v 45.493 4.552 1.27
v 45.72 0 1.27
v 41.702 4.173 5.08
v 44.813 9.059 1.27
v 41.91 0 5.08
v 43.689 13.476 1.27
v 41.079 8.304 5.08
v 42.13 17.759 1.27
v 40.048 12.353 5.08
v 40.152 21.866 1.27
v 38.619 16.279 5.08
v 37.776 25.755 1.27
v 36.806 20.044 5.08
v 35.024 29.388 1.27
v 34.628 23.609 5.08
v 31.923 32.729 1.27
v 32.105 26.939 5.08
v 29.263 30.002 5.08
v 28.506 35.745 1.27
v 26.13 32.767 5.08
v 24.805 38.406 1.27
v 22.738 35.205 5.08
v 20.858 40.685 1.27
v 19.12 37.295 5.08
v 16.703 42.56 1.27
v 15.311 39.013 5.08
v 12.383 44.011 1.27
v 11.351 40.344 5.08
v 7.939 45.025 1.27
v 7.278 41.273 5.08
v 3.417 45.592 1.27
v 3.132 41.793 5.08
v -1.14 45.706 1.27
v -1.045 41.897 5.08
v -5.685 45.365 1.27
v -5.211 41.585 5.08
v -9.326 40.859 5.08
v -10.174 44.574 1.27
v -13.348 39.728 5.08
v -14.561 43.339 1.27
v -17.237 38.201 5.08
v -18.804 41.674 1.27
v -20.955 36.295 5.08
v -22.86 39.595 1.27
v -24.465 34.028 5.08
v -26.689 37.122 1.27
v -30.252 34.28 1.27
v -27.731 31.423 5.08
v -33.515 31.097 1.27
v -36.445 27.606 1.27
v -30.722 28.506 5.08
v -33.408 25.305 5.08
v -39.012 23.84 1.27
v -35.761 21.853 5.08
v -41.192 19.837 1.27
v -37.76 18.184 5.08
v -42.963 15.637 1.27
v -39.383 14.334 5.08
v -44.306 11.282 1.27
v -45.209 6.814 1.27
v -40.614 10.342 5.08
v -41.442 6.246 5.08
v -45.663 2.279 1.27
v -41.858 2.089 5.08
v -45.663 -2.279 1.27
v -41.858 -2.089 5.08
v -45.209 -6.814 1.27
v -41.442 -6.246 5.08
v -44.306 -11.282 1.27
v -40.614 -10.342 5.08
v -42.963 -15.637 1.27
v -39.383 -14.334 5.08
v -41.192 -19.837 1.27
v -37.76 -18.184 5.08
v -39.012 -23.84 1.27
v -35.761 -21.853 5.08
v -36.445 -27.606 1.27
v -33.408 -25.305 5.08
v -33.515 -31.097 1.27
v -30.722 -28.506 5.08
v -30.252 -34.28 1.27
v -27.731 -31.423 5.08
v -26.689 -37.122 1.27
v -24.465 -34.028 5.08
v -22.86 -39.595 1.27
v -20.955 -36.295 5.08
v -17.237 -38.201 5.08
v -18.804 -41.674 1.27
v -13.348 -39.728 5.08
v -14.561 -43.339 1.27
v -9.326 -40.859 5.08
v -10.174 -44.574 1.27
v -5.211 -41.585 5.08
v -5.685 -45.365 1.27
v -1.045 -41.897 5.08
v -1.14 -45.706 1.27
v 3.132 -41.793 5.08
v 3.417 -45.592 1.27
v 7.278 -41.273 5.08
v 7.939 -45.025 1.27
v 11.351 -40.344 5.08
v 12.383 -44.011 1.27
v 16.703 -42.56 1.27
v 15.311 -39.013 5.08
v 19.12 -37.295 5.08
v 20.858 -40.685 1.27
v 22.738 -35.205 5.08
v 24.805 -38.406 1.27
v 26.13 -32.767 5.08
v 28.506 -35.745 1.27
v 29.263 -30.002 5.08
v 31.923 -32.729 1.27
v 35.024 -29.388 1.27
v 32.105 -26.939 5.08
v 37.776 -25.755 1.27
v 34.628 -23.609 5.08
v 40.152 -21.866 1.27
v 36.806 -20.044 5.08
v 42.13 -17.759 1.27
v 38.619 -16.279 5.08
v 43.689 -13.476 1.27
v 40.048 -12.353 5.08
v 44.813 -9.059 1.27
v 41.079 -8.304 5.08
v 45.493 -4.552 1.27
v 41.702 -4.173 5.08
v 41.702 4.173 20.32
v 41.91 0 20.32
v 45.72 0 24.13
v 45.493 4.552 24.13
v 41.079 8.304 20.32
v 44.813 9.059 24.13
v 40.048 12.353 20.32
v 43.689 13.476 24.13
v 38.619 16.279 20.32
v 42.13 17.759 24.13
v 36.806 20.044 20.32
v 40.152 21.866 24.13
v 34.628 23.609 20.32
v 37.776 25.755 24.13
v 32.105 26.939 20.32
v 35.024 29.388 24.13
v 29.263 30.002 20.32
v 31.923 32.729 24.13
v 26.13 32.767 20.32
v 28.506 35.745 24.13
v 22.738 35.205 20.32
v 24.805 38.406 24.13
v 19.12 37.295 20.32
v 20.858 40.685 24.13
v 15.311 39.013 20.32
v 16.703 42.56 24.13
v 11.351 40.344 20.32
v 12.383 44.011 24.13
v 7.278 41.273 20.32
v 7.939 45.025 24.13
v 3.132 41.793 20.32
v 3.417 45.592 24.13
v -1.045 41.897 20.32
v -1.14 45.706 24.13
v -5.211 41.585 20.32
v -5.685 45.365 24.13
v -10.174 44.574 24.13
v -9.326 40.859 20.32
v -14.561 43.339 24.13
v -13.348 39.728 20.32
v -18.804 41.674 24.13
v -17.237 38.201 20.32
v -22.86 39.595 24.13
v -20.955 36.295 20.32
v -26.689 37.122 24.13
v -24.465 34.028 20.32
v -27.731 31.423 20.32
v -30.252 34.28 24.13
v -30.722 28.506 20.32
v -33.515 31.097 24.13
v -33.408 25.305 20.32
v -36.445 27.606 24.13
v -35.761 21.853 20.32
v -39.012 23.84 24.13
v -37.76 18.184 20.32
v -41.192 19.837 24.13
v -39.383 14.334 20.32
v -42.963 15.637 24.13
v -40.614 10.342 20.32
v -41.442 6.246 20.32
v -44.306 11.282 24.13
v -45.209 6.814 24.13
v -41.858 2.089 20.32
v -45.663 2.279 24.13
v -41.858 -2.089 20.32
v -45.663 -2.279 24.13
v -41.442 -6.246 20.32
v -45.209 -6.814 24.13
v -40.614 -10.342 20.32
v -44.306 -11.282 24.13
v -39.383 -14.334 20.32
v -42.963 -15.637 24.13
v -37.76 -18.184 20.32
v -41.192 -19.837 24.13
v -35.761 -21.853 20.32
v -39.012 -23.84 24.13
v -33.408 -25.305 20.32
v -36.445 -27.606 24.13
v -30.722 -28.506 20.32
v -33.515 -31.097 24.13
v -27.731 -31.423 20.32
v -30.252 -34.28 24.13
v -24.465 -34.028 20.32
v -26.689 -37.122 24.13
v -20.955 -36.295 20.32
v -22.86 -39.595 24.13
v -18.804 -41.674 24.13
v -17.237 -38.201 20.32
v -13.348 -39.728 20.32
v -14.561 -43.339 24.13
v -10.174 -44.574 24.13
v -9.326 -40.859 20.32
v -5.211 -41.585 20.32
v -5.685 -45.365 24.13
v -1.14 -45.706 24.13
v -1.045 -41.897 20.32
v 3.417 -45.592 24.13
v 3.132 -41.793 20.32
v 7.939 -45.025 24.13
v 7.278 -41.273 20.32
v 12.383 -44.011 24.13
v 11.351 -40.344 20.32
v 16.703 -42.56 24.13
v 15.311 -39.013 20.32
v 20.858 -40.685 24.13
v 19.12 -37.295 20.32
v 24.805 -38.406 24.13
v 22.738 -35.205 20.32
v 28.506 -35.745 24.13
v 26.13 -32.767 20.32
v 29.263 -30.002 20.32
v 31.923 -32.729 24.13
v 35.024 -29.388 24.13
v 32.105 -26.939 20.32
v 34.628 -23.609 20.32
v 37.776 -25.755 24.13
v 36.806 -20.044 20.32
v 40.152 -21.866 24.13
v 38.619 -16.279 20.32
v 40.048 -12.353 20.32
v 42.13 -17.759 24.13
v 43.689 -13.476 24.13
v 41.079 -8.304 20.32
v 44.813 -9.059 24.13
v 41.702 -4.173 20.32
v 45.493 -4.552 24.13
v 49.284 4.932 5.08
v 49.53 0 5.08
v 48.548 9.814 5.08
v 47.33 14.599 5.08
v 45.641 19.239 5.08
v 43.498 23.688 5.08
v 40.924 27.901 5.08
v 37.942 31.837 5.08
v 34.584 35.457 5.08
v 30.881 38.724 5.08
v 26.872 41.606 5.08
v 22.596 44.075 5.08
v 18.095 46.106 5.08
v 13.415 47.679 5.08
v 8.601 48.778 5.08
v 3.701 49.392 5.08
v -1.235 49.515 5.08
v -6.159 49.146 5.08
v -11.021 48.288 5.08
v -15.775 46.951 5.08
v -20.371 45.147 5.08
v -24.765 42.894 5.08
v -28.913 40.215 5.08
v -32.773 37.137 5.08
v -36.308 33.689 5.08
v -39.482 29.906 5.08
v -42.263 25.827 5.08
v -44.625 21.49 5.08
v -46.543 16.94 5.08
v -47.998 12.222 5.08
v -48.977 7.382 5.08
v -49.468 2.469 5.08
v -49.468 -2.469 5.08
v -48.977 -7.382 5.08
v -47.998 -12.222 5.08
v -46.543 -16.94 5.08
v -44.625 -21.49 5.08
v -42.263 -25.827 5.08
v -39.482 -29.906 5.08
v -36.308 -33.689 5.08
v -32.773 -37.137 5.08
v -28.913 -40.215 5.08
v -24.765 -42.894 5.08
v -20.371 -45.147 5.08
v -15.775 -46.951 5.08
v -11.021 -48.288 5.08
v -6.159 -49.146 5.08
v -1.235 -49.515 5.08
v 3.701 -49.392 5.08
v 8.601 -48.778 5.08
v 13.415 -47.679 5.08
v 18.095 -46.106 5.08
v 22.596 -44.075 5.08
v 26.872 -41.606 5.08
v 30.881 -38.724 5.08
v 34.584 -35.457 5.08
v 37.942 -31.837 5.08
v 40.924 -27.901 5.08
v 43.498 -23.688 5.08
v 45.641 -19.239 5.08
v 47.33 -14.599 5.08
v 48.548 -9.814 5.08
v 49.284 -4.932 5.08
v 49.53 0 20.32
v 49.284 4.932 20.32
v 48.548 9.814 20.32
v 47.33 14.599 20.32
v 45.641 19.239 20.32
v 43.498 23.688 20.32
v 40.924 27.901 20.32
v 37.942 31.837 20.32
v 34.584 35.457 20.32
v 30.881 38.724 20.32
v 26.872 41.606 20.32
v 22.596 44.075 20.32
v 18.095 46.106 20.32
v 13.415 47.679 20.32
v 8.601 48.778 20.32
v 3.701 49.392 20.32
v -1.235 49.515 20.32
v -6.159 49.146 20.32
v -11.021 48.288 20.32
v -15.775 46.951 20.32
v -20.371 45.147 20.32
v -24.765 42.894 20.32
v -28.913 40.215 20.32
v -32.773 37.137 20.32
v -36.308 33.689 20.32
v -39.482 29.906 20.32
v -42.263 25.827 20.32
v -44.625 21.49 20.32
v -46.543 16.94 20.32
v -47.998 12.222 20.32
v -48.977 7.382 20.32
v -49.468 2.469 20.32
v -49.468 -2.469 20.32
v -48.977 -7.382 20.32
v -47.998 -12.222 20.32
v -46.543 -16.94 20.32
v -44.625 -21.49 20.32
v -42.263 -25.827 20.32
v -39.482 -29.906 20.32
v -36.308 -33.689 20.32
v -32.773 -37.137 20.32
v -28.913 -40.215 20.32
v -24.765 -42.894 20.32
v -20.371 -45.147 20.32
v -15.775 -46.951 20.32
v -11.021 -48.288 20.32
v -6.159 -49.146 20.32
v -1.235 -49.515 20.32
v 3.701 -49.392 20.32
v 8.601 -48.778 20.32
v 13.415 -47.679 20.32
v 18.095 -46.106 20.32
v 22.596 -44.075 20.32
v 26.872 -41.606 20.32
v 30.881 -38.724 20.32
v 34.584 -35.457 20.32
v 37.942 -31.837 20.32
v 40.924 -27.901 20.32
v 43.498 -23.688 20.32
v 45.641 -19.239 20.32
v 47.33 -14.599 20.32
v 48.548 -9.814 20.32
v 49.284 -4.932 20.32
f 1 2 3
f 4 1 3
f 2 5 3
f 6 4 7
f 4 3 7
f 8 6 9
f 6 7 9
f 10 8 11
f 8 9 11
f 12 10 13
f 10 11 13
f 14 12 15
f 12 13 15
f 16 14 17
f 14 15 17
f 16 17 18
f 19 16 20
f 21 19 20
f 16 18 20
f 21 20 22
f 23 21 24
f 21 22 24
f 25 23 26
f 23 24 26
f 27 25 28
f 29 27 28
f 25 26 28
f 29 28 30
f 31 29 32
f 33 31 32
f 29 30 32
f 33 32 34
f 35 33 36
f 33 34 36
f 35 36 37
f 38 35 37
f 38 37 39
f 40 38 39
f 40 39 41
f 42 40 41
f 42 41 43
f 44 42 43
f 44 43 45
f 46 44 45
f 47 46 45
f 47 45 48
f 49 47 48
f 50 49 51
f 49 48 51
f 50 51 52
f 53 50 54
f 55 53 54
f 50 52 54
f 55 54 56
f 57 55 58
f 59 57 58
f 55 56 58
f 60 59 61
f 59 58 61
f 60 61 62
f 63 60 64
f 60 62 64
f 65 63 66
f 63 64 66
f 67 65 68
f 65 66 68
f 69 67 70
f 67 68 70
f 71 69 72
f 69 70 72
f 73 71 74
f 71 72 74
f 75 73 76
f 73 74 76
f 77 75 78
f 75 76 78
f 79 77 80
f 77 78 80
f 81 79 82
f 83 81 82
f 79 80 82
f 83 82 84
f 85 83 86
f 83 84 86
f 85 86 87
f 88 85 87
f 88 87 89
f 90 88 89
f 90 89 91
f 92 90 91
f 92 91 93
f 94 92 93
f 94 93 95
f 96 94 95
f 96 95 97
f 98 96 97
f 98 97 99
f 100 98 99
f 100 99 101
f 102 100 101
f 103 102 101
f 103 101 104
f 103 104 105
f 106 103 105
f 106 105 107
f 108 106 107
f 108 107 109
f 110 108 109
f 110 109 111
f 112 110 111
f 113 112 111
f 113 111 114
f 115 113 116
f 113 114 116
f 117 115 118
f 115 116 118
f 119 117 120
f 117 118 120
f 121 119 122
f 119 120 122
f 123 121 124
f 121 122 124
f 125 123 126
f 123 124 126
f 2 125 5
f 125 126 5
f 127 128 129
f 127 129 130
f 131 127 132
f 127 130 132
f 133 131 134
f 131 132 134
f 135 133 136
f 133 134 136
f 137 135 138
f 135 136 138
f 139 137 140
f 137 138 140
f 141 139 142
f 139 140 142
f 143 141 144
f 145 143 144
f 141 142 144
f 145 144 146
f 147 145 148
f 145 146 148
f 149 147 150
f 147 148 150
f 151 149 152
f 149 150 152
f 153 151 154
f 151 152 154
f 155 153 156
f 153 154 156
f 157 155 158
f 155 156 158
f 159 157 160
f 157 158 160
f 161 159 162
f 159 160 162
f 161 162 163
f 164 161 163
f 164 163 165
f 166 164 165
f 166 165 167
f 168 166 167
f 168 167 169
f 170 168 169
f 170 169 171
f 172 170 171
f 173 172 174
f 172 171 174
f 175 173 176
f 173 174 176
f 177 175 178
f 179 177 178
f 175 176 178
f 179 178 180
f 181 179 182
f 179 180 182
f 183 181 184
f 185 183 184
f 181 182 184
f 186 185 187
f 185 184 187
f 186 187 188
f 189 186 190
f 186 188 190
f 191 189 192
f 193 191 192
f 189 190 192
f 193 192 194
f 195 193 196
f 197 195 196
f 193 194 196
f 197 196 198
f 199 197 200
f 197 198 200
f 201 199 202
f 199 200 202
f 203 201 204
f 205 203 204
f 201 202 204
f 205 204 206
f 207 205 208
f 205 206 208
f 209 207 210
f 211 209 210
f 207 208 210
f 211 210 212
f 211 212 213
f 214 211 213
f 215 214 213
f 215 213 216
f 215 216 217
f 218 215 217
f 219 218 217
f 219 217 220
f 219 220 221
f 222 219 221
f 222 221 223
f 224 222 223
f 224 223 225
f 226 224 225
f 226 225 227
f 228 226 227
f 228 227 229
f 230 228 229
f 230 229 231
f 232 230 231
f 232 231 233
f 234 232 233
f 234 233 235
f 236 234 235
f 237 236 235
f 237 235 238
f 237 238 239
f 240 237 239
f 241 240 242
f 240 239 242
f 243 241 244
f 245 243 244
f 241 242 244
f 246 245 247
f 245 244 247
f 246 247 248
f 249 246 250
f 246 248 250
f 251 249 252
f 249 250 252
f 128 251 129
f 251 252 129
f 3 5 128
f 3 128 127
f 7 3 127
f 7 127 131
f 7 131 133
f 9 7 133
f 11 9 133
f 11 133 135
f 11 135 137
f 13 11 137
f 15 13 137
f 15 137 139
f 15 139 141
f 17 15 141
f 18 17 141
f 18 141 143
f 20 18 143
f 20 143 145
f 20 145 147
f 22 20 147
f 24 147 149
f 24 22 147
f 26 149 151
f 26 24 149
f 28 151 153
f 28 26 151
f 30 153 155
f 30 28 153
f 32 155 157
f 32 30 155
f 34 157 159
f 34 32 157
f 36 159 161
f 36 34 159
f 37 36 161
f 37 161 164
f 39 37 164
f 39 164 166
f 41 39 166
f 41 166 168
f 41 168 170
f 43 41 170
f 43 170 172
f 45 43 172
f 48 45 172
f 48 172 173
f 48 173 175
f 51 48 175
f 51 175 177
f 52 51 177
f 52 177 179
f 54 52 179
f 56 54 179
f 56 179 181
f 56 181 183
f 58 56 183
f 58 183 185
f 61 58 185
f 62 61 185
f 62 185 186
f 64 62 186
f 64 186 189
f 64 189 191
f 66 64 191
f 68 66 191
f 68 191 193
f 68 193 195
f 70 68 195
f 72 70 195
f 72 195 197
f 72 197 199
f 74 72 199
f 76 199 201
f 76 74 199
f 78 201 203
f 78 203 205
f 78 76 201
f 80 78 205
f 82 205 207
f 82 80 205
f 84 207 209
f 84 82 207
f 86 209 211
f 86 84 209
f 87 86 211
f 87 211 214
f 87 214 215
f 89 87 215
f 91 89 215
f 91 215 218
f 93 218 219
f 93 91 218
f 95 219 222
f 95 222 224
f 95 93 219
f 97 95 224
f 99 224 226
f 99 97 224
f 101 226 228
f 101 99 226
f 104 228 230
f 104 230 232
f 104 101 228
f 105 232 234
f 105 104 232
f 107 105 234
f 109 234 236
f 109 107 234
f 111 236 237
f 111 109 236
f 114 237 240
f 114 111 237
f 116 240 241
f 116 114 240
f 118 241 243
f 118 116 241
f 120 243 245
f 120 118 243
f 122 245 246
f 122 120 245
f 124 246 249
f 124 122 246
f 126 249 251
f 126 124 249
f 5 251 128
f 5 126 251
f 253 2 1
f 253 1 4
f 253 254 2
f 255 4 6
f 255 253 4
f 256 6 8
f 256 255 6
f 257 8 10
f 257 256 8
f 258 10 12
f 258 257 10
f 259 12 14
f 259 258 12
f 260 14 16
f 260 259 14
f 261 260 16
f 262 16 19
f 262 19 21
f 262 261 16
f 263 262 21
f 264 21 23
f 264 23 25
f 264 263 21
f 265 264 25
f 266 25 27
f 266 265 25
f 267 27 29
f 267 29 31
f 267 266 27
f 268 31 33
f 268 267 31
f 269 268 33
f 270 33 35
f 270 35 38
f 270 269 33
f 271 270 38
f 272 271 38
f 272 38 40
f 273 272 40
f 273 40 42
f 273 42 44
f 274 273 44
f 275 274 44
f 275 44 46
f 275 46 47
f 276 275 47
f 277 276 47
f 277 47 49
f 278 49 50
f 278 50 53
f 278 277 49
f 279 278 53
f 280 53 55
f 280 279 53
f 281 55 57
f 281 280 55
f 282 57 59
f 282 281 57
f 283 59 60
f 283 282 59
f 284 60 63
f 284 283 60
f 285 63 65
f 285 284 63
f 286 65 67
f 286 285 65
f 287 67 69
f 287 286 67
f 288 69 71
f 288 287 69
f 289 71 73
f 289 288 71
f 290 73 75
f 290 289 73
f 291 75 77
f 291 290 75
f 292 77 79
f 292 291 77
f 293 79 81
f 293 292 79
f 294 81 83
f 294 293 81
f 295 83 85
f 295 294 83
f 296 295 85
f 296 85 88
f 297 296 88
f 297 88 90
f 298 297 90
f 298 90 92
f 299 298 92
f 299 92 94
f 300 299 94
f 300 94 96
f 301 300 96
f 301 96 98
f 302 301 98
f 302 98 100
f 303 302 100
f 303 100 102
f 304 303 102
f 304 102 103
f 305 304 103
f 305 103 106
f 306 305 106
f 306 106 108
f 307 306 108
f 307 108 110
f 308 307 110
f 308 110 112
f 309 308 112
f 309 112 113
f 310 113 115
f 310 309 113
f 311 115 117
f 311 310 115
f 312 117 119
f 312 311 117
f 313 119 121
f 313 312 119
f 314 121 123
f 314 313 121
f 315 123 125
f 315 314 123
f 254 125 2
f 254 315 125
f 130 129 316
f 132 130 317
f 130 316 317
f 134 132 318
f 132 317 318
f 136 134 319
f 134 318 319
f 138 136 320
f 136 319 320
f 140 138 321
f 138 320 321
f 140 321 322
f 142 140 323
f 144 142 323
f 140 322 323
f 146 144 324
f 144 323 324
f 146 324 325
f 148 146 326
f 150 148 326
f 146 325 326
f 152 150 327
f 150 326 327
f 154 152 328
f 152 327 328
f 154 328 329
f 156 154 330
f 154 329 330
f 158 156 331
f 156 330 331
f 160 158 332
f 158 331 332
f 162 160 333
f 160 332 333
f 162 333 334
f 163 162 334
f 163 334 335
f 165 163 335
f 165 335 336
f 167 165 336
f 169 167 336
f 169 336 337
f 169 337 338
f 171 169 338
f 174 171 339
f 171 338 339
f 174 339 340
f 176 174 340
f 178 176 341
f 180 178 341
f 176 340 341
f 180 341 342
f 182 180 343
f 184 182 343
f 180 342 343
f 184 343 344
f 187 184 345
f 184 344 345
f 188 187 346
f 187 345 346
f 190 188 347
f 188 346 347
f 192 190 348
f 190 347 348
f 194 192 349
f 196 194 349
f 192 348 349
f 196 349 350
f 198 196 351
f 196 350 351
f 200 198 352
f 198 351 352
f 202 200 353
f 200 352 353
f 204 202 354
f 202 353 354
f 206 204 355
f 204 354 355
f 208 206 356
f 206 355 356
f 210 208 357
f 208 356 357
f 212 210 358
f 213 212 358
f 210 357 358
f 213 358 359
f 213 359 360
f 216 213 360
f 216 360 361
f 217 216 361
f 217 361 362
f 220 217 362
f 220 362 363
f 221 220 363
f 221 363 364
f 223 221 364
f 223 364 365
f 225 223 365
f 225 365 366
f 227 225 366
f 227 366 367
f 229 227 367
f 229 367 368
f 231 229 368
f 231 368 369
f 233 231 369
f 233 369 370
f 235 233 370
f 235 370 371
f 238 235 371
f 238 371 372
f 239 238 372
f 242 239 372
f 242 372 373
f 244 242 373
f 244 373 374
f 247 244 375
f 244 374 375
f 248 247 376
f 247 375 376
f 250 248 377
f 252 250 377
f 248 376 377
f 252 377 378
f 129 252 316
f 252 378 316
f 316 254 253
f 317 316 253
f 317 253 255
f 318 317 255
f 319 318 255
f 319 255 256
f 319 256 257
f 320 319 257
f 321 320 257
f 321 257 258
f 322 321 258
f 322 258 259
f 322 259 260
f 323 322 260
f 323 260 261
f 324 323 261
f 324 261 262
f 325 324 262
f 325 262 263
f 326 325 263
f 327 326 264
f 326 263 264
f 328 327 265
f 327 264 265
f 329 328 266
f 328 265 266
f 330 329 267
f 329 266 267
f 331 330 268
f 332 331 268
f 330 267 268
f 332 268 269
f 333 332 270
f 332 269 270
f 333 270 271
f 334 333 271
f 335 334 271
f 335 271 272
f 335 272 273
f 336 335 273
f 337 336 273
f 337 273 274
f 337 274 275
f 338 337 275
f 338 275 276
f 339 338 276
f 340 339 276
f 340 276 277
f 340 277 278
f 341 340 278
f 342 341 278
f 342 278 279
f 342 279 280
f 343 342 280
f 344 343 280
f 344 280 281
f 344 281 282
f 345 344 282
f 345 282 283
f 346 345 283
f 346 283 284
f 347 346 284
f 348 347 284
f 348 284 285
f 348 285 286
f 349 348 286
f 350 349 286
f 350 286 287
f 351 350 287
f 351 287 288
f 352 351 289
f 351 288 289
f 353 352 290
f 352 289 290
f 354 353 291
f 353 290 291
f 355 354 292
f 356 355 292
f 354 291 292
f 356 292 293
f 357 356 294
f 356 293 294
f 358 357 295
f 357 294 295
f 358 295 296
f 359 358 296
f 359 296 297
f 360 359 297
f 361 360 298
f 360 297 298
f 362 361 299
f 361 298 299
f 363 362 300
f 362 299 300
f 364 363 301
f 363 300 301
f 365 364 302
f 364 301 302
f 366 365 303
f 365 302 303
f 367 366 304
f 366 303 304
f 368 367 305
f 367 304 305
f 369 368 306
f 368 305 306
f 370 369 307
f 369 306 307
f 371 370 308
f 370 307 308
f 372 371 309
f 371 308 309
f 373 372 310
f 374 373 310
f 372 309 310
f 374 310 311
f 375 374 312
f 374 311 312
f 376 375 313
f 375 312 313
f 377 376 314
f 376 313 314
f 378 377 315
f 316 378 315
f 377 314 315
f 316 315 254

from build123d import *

# Parameters (mm, degrees)
F0_R     = 49.53
F0_R_2   = 41.91
F1_DEPTH = 25.4
F2_SIZE  = 5.08
F4_SIZE  = 5.08


# Not quite as in the source:
# - a fillet or chamfer that OpenCascade refuses, or shapes differently, is made with other operations: its cross-section is extruded or revolved along the edge and cut away or added


with BuildPart() as f1:
    # F0 (on Top) → F1 (new body)
    with BuildSketch(Plane.XY):
        Circle(F0_R)
        Circle(F0_R_2, mode=Mode.SUBTRACT)
    extrude(amount=F1_DEPTH)

    # F2
    f2_edges = [f1.edges().sort_by_distance(p)[0] for p in [
        (-41.91, 0, 25.4),
    ]]
    chamfer(f2_edges, length=F2_SIZE)

    # F3: chamfer of 5.08 on 1 edges, made by hand

    # F3_s1 → F3_t2 (revolve, cut)
    with BuildSketch(Plane.XZ):
        Polygon((44.45, 25.4), (49.53, 20.32), (49.53, 25.4), align=None)
    revolve(axis=Axis((0, 0, 25.4), (0, 0, 1)), mode=Mode.SUBTRACT)

    # F4
    f4_edges = [f1.edges().sort_by_distance(p)[0] for p in [
        (-49.53, 0, 0),
    ]]
    chamfer(f4_edges, length=F4_SIZE)

    # F5: chamfer of 5.08 on 1 edges, made by hand

    # F5_s1 → F5_t2 (revolve, cut)
    with BuildSketch(Plane.XZ):
        Polygon((46.99, 0), (41.91, 5.08), (41.91, 0), align=None)
    revolve(axis=Axis((0, 0, 0), (0, 0, 1)), mode=Mode.SUBTRACT)


solid = f1.part
